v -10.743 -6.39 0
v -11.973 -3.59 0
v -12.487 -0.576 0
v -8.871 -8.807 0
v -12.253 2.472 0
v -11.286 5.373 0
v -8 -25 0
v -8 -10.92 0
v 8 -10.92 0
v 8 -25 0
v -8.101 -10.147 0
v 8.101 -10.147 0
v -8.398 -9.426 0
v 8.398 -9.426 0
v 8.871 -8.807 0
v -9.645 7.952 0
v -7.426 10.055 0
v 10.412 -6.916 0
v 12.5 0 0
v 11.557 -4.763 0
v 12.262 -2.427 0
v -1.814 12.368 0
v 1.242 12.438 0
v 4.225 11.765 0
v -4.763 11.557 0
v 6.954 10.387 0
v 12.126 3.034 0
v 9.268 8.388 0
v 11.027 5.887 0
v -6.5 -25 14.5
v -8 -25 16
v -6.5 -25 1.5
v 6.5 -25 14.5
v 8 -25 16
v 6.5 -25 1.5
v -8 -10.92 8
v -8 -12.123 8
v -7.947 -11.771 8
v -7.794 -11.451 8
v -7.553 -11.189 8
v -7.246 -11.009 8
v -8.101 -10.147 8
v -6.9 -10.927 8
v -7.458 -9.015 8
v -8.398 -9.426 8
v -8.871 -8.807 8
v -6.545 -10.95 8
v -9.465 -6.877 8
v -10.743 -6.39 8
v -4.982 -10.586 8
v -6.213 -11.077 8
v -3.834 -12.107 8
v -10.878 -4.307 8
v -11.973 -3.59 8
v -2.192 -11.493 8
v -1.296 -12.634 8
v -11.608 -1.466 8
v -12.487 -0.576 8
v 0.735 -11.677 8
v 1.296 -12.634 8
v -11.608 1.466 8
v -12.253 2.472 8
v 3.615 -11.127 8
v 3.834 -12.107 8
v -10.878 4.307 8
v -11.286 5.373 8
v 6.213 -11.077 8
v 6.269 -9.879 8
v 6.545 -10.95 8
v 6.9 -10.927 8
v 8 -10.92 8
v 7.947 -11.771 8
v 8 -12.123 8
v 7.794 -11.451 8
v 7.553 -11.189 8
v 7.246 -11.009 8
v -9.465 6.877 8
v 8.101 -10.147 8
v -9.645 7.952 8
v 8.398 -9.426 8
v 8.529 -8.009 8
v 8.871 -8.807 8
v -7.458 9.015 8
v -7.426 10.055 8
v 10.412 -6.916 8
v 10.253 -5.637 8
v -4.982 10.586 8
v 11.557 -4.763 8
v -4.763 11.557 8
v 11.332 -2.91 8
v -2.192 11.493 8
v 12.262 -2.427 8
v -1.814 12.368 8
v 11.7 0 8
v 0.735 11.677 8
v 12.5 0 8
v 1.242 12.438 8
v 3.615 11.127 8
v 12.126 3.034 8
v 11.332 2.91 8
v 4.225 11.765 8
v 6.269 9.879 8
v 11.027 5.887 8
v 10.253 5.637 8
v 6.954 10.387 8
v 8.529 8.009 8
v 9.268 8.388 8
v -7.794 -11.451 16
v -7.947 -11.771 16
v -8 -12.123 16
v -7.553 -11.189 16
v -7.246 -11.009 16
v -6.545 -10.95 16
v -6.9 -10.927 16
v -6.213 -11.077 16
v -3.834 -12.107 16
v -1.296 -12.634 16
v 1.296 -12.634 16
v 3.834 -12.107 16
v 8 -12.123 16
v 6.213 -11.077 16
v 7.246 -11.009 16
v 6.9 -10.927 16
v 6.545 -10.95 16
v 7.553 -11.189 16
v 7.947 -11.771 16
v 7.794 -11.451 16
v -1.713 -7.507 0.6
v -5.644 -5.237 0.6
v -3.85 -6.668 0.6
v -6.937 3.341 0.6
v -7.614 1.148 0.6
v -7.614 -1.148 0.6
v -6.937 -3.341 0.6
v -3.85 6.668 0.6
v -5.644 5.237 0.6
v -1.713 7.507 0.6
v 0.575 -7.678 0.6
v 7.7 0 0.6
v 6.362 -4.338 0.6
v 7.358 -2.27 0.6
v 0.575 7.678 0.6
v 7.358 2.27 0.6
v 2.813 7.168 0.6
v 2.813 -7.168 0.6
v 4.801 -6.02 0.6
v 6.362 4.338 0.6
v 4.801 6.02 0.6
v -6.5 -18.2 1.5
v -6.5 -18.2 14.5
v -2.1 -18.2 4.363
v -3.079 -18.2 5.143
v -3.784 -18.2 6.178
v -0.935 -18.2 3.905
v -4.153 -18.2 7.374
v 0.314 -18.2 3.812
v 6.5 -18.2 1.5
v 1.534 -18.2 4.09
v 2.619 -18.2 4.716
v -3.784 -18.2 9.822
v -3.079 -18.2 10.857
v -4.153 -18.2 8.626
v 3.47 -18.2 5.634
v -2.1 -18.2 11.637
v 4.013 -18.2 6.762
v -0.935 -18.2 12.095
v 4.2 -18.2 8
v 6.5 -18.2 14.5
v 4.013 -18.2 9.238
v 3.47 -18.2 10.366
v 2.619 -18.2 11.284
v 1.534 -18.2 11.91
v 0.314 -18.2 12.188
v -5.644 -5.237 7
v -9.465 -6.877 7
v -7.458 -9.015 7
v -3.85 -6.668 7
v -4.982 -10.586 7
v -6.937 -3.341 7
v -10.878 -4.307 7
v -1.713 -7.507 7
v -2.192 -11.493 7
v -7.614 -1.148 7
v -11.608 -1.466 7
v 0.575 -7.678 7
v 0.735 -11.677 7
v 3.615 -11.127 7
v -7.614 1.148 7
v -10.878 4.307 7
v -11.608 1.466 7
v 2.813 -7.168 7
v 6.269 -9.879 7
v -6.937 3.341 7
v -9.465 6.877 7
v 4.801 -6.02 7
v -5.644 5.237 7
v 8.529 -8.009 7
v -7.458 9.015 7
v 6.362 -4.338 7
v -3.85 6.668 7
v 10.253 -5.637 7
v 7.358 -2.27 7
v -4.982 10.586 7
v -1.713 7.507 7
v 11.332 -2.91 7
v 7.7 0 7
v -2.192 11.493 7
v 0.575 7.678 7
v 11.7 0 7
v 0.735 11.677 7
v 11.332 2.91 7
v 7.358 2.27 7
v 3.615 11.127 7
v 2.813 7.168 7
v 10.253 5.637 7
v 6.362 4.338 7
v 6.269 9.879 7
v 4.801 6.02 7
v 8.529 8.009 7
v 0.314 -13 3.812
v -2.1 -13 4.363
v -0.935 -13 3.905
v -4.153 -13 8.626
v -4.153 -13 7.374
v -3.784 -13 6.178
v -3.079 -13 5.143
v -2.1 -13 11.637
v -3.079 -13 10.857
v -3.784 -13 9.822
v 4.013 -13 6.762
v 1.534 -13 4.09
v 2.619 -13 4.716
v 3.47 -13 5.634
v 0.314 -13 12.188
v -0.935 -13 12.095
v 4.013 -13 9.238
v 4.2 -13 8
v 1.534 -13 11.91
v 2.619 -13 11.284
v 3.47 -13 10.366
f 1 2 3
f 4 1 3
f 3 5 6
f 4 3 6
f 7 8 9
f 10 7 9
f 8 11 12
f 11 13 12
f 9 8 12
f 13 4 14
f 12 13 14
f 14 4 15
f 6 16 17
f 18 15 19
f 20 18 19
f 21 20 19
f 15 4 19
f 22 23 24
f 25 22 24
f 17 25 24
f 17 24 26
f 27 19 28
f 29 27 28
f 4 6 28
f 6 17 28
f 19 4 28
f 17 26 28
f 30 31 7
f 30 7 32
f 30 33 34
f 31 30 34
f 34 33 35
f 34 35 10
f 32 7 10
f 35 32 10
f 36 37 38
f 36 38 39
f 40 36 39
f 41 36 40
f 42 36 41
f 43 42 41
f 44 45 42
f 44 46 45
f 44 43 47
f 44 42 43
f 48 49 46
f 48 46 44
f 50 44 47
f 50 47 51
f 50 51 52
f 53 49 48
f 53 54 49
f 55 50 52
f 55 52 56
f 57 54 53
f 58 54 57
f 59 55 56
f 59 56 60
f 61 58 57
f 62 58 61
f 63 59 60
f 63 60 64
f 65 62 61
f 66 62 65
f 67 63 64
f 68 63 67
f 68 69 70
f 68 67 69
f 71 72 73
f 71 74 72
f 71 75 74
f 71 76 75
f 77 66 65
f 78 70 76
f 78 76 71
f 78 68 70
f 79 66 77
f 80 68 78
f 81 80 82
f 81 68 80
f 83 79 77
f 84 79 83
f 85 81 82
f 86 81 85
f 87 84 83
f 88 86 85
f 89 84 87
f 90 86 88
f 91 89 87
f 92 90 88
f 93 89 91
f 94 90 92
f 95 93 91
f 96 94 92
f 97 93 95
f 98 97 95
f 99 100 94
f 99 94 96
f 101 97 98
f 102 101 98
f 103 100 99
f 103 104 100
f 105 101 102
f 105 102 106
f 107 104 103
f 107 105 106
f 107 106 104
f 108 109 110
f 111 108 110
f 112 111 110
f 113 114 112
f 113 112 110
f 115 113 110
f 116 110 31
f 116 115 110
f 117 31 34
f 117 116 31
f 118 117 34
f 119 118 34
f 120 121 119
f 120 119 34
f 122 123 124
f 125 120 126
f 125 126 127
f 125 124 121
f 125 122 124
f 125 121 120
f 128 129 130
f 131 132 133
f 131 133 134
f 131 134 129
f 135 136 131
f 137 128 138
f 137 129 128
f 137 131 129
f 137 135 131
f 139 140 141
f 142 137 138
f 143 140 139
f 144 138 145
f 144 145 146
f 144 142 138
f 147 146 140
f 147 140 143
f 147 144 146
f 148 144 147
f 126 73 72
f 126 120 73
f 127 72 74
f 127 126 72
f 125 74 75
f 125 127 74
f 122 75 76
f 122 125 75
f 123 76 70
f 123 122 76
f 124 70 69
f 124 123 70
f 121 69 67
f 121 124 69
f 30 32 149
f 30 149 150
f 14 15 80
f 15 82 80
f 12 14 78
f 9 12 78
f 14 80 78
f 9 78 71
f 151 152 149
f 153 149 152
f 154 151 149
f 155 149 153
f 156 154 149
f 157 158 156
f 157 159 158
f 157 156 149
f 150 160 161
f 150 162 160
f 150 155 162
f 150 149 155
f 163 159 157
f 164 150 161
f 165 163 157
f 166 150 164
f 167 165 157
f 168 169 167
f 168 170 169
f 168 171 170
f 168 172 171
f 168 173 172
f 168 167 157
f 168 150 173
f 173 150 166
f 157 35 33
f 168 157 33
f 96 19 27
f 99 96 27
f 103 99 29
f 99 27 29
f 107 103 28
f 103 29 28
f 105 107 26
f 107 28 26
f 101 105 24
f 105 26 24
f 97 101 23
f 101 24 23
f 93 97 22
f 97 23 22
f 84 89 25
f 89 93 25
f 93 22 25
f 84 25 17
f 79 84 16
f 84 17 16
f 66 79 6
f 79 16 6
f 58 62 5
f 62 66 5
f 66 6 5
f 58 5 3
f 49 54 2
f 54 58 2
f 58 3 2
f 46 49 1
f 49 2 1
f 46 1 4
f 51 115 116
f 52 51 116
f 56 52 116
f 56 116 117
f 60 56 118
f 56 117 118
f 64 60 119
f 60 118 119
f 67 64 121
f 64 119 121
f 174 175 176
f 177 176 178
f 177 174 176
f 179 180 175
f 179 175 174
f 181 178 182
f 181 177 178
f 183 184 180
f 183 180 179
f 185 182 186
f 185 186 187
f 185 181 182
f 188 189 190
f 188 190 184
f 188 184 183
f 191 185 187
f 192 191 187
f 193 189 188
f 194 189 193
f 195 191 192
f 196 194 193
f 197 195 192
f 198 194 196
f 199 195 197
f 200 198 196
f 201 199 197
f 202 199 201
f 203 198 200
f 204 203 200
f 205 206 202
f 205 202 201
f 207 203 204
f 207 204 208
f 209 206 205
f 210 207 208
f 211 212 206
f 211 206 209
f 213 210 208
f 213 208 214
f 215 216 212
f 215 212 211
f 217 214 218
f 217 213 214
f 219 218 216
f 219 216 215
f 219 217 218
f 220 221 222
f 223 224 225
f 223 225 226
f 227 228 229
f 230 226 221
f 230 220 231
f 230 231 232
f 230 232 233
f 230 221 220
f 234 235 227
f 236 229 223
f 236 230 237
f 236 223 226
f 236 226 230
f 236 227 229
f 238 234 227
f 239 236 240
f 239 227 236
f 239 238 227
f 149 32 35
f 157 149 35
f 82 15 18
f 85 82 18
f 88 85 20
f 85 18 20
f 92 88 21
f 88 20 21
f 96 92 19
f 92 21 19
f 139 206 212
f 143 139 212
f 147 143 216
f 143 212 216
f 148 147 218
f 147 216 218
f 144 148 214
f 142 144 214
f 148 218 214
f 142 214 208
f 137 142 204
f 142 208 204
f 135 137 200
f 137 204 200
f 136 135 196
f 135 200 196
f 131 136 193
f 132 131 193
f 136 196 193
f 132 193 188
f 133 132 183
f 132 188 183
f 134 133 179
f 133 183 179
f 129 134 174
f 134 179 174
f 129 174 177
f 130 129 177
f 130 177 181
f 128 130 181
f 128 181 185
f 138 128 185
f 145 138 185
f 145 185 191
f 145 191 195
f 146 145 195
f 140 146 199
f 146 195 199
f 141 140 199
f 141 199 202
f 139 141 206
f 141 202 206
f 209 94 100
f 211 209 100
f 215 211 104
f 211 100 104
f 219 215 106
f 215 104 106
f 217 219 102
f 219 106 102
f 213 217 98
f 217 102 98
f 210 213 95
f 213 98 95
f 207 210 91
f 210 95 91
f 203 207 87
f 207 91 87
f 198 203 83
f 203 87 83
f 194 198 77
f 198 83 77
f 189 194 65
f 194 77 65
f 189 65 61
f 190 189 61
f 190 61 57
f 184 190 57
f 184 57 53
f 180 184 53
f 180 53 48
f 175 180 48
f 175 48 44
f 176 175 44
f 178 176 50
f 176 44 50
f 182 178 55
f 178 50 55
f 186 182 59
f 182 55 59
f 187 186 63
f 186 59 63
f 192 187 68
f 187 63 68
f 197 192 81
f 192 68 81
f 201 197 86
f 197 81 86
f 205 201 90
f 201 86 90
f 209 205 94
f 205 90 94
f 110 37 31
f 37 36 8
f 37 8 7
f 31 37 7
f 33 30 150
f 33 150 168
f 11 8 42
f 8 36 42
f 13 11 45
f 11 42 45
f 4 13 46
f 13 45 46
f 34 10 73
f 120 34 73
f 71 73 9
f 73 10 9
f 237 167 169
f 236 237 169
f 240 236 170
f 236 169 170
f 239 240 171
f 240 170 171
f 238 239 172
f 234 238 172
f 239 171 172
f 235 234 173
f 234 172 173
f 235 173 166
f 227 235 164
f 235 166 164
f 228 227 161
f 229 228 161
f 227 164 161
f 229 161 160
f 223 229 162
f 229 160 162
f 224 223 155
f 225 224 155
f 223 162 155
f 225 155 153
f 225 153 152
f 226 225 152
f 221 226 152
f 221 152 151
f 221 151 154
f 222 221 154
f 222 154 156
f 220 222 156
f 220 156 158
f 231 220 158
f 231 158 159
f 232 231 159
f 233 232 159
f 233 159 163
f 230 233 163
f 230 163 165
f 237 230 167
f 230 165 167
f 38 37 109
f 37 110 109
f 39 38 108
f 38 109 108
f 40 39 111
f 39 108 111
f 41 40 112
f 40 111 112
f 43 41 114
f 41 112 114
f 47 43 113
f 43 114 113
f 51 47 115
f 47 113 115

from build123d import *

# Parameters (mm, degrees)
F1_DEPTH  = 16
F2_R      = 12.7
F3_DEPTH  = 8
F4_R      = 1.2
F5_R      = 3
F6_R      = 11.7
F7_DEPTH  = 1
F8_R      = 7.7
F9_DEPTH  = 6.4
F10_W     = 13
F10_H     = 13
F11_DEPTH = 6.8
F12_R     = 4.2
F13_DEPTH = 5.2


with BuildPart() as f1:
    # F0 (on Top) → F1 (new body)
    with BuildSketch(Plane.XY):
        with BuildLine():
            ThreePointArc((8, -9.6046863561), (11.3192314227, -5.3033008589), (12.5, 0))
            ThreePointArc((12.5, 0), (-5.3033008589, 11.3192314227), (-8, -9.6046863561))
            Line((-8, -9.6046863561), (-8, 0))
            Line((-8, 0), (8, 0))
            Line((8, 0), (8, -9.6046863561))
        make_face()
        with BuildLine():
            Line((-8, 0), (-8, -9.6046863561))
            ThreePointArc((-8, -9.6046863561), (0, -12.5), (8, -9.6046863561))
            Line((8, -9.6046863561), (8, 0))
            Line((8, 0), (-8, 0))
        make_face()
        with BuildLine():
            ThreePointArc((8, -9.6046863561), (0, -12.5), (-8, -9.6046863561))
            Line((-8, -9.6046863561), (-8, -25))
            Line((-8, -25), (8, -25))
            Line((8, -25), (8, -9.6046863561))
        make_face()
    extrude(amount=F1_DEPTH)

    # F2 (on face) → F3 (cut)
    with BuildSketch(Plane.XY.offset(16)):
        Circle(F2_R)
    extrude(amount=-F3_DEPTH, mode=Mode.SUBTRACT)

    # F4
    f4_edges = [f1.edges().sort_by_distance(p)[0] for p in [
        (-8, -9.863569, 12),
        (8, -9.863569, 12),
    ]]
    fillet(f4_edges, radius=F4_R)

    # F5
    f5_edges = [f1.edges().sort_by_distance(p)[0] for p in [
        (8, -9.604686, 4),
        (-8, -9.604686, 4),
    ]]
    fillet(f5_edges, radius=F5_R)

    # F6 (on face) → F7 (cut)
    with BuildSketch(Plane.XY.offset(8)):
        Circle(F6_R)
    extrude(amount=-F7_DEPTH, mode=Mode.SUBTRACT)

    # F8 (on face) → F9 (cut)
    with BuildSketch(Plane.XY.offset(7)):
        Circle(F8_R)
    extrude(amount=-F9_DEPTH, mode=Mode.SUBTRACT)

    # F10 (on face) → F11 (cut)
    with BuildSketch(Plane.XZ.offset(25)):
        with Locations((0, 8)):
            Rectangle(F10_W, F10_H)
    extrude(amount=-F11_DEPTH, mode=Mode.SUBTRACT)

    # F12 (on face) → F13 (cut)
    with BuildSketch(Plane.XZ.offset(18.2)):
        with Locations((0, 8)):
            Circle(F12_R)
    extrude(amount=-F13_DEPTH, mode=Mode.SUBTRACT)


solid = f1.part
